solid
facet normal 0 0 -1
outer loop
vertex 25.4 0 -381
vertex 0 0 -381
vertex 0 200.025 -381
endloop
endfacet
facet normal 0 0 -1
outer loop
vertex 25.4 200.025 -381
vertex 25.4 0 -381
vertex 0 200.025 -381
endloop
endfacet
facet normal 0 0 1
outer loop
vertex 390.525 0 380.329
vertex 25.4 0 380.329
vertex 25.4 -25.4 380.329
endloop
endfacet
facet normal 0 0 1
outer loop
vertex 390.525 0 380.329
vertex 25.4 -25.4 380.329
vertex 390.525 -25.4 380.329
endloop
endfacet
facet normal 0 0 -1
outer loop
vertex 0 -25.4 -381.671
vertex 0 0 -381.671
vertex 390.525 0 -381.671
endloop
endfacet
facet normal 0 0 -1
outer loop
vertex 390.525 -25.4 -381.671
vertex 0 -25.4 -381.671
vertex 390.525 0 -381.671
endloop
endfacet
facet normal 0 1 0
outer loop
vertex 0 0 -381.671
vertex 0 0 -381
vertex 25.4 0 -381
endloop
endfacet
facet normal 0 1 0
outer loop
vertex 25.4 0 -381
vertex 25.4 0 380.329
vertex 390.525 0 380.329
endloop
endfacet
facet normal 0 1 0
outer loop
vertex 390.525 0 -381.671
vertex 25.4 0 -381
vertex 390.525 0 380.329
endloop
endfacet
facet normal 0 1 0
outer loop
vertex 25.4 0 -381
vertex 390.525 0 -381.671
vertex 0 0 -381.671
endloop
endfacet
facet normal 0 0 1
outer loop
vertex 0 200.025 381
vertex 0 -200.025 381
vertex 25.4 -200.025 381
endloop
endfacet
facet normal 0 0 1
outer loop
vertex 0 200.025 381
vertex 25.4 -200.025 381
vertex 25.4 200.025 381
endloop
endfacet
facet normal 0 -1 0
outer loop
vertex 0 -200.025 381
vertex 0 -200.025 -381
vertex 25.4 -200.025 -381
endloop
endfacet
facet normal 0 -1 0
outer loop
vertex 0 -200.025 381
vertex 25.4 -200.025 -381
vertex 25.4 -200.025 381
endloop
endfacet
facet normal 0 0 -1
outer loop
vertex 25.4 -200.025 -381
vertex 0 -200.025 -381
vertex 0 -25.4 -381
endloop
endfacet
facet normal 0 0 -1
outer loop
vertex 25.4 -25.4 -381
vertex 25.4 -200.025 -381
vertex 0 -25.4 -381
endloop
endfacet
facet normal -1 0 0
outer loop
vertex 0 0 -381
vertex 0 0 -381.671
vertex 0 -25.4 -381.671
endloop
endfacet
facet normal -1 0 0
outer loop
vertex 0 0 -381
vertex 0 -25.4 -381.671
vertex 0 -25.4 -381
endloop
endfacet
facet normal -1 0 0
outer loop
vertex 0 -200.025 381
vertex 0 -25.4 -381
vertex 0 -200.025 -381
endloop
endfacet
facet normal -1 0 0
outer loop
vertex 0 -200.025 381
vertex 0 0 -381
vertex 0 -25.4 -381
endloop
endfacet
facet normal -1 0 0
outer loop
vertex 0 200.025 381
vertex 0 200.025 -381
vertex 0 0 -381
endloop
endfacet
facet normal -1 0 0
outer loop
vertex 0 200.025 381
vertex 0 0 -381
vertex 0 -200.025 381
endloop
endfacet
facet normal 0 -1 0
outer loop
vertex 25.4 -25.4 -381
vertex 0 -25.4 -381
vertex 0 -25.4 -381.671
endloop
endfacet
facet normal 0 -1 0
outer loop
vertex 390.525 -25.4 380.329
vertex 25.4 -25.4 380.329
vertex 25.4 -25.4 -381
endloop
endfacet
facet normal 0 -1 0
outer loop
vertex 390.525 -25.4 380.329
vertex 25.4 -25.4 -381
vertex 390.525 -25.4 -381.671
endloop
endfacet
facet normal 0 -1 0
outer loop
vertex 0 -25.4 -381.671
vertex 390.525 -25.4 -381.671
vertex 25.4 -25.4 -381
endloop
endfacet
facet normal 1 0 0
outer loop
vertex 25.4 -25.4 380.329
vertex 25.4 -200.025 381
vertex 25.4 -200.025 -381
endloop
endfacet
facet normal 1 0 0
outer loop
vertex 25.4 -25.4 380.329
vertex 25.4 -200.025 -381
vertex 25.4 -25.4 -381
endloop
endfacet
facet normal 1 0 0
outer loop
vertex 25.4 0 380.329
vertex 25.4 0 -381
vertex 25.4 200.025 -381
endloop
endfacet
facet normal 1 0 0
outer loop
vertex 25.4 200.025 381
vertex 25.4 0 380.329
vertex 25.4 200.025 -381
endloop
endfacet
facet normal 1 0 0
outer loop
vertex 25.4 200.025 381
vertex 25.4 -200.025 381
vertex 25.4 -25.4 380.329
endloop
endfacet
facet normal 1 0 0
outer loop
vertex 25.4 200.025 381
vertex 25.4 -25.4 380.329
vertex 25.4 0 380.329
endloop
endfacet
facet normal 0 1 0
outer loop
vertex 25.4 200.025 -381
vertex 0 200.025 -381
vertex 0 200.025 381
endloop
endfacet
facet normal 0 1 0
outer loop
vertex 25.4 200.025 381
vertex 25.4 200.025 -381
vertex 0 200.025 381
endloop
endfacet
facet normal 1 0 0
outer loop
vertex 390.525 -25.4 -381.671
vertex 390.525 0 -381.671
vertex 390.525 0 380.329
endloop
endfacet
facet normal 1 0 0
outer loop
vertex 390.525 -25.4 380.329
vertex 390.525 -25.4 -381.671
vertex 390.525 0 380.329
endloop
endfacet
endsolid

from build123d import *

# Parameters (mm, degrees)
F0_W     = 400.05
F0_H     = 762
F1_DEPTH = 25.4
F2_W     = 390.525
F2_H     = 762
F3_DEPTH = 25.4


with BuildPart() as f1:
    # F0 (on Right) → F1 (new body)
    with BuildSketch(Plane.YZ):
        Rectangle(F0_W, F0_H)
    extrude(amount=F1_DEPTH)

    # F2 (on Front) → F3 (join)
    with BuildSketch(Plane.XZ):
        with Locations((195.2625, -0.671017)):
            Rectangle(F2_W, F2_H)
    extrude(amount=F3_DEPTH)


solid = f1.part
